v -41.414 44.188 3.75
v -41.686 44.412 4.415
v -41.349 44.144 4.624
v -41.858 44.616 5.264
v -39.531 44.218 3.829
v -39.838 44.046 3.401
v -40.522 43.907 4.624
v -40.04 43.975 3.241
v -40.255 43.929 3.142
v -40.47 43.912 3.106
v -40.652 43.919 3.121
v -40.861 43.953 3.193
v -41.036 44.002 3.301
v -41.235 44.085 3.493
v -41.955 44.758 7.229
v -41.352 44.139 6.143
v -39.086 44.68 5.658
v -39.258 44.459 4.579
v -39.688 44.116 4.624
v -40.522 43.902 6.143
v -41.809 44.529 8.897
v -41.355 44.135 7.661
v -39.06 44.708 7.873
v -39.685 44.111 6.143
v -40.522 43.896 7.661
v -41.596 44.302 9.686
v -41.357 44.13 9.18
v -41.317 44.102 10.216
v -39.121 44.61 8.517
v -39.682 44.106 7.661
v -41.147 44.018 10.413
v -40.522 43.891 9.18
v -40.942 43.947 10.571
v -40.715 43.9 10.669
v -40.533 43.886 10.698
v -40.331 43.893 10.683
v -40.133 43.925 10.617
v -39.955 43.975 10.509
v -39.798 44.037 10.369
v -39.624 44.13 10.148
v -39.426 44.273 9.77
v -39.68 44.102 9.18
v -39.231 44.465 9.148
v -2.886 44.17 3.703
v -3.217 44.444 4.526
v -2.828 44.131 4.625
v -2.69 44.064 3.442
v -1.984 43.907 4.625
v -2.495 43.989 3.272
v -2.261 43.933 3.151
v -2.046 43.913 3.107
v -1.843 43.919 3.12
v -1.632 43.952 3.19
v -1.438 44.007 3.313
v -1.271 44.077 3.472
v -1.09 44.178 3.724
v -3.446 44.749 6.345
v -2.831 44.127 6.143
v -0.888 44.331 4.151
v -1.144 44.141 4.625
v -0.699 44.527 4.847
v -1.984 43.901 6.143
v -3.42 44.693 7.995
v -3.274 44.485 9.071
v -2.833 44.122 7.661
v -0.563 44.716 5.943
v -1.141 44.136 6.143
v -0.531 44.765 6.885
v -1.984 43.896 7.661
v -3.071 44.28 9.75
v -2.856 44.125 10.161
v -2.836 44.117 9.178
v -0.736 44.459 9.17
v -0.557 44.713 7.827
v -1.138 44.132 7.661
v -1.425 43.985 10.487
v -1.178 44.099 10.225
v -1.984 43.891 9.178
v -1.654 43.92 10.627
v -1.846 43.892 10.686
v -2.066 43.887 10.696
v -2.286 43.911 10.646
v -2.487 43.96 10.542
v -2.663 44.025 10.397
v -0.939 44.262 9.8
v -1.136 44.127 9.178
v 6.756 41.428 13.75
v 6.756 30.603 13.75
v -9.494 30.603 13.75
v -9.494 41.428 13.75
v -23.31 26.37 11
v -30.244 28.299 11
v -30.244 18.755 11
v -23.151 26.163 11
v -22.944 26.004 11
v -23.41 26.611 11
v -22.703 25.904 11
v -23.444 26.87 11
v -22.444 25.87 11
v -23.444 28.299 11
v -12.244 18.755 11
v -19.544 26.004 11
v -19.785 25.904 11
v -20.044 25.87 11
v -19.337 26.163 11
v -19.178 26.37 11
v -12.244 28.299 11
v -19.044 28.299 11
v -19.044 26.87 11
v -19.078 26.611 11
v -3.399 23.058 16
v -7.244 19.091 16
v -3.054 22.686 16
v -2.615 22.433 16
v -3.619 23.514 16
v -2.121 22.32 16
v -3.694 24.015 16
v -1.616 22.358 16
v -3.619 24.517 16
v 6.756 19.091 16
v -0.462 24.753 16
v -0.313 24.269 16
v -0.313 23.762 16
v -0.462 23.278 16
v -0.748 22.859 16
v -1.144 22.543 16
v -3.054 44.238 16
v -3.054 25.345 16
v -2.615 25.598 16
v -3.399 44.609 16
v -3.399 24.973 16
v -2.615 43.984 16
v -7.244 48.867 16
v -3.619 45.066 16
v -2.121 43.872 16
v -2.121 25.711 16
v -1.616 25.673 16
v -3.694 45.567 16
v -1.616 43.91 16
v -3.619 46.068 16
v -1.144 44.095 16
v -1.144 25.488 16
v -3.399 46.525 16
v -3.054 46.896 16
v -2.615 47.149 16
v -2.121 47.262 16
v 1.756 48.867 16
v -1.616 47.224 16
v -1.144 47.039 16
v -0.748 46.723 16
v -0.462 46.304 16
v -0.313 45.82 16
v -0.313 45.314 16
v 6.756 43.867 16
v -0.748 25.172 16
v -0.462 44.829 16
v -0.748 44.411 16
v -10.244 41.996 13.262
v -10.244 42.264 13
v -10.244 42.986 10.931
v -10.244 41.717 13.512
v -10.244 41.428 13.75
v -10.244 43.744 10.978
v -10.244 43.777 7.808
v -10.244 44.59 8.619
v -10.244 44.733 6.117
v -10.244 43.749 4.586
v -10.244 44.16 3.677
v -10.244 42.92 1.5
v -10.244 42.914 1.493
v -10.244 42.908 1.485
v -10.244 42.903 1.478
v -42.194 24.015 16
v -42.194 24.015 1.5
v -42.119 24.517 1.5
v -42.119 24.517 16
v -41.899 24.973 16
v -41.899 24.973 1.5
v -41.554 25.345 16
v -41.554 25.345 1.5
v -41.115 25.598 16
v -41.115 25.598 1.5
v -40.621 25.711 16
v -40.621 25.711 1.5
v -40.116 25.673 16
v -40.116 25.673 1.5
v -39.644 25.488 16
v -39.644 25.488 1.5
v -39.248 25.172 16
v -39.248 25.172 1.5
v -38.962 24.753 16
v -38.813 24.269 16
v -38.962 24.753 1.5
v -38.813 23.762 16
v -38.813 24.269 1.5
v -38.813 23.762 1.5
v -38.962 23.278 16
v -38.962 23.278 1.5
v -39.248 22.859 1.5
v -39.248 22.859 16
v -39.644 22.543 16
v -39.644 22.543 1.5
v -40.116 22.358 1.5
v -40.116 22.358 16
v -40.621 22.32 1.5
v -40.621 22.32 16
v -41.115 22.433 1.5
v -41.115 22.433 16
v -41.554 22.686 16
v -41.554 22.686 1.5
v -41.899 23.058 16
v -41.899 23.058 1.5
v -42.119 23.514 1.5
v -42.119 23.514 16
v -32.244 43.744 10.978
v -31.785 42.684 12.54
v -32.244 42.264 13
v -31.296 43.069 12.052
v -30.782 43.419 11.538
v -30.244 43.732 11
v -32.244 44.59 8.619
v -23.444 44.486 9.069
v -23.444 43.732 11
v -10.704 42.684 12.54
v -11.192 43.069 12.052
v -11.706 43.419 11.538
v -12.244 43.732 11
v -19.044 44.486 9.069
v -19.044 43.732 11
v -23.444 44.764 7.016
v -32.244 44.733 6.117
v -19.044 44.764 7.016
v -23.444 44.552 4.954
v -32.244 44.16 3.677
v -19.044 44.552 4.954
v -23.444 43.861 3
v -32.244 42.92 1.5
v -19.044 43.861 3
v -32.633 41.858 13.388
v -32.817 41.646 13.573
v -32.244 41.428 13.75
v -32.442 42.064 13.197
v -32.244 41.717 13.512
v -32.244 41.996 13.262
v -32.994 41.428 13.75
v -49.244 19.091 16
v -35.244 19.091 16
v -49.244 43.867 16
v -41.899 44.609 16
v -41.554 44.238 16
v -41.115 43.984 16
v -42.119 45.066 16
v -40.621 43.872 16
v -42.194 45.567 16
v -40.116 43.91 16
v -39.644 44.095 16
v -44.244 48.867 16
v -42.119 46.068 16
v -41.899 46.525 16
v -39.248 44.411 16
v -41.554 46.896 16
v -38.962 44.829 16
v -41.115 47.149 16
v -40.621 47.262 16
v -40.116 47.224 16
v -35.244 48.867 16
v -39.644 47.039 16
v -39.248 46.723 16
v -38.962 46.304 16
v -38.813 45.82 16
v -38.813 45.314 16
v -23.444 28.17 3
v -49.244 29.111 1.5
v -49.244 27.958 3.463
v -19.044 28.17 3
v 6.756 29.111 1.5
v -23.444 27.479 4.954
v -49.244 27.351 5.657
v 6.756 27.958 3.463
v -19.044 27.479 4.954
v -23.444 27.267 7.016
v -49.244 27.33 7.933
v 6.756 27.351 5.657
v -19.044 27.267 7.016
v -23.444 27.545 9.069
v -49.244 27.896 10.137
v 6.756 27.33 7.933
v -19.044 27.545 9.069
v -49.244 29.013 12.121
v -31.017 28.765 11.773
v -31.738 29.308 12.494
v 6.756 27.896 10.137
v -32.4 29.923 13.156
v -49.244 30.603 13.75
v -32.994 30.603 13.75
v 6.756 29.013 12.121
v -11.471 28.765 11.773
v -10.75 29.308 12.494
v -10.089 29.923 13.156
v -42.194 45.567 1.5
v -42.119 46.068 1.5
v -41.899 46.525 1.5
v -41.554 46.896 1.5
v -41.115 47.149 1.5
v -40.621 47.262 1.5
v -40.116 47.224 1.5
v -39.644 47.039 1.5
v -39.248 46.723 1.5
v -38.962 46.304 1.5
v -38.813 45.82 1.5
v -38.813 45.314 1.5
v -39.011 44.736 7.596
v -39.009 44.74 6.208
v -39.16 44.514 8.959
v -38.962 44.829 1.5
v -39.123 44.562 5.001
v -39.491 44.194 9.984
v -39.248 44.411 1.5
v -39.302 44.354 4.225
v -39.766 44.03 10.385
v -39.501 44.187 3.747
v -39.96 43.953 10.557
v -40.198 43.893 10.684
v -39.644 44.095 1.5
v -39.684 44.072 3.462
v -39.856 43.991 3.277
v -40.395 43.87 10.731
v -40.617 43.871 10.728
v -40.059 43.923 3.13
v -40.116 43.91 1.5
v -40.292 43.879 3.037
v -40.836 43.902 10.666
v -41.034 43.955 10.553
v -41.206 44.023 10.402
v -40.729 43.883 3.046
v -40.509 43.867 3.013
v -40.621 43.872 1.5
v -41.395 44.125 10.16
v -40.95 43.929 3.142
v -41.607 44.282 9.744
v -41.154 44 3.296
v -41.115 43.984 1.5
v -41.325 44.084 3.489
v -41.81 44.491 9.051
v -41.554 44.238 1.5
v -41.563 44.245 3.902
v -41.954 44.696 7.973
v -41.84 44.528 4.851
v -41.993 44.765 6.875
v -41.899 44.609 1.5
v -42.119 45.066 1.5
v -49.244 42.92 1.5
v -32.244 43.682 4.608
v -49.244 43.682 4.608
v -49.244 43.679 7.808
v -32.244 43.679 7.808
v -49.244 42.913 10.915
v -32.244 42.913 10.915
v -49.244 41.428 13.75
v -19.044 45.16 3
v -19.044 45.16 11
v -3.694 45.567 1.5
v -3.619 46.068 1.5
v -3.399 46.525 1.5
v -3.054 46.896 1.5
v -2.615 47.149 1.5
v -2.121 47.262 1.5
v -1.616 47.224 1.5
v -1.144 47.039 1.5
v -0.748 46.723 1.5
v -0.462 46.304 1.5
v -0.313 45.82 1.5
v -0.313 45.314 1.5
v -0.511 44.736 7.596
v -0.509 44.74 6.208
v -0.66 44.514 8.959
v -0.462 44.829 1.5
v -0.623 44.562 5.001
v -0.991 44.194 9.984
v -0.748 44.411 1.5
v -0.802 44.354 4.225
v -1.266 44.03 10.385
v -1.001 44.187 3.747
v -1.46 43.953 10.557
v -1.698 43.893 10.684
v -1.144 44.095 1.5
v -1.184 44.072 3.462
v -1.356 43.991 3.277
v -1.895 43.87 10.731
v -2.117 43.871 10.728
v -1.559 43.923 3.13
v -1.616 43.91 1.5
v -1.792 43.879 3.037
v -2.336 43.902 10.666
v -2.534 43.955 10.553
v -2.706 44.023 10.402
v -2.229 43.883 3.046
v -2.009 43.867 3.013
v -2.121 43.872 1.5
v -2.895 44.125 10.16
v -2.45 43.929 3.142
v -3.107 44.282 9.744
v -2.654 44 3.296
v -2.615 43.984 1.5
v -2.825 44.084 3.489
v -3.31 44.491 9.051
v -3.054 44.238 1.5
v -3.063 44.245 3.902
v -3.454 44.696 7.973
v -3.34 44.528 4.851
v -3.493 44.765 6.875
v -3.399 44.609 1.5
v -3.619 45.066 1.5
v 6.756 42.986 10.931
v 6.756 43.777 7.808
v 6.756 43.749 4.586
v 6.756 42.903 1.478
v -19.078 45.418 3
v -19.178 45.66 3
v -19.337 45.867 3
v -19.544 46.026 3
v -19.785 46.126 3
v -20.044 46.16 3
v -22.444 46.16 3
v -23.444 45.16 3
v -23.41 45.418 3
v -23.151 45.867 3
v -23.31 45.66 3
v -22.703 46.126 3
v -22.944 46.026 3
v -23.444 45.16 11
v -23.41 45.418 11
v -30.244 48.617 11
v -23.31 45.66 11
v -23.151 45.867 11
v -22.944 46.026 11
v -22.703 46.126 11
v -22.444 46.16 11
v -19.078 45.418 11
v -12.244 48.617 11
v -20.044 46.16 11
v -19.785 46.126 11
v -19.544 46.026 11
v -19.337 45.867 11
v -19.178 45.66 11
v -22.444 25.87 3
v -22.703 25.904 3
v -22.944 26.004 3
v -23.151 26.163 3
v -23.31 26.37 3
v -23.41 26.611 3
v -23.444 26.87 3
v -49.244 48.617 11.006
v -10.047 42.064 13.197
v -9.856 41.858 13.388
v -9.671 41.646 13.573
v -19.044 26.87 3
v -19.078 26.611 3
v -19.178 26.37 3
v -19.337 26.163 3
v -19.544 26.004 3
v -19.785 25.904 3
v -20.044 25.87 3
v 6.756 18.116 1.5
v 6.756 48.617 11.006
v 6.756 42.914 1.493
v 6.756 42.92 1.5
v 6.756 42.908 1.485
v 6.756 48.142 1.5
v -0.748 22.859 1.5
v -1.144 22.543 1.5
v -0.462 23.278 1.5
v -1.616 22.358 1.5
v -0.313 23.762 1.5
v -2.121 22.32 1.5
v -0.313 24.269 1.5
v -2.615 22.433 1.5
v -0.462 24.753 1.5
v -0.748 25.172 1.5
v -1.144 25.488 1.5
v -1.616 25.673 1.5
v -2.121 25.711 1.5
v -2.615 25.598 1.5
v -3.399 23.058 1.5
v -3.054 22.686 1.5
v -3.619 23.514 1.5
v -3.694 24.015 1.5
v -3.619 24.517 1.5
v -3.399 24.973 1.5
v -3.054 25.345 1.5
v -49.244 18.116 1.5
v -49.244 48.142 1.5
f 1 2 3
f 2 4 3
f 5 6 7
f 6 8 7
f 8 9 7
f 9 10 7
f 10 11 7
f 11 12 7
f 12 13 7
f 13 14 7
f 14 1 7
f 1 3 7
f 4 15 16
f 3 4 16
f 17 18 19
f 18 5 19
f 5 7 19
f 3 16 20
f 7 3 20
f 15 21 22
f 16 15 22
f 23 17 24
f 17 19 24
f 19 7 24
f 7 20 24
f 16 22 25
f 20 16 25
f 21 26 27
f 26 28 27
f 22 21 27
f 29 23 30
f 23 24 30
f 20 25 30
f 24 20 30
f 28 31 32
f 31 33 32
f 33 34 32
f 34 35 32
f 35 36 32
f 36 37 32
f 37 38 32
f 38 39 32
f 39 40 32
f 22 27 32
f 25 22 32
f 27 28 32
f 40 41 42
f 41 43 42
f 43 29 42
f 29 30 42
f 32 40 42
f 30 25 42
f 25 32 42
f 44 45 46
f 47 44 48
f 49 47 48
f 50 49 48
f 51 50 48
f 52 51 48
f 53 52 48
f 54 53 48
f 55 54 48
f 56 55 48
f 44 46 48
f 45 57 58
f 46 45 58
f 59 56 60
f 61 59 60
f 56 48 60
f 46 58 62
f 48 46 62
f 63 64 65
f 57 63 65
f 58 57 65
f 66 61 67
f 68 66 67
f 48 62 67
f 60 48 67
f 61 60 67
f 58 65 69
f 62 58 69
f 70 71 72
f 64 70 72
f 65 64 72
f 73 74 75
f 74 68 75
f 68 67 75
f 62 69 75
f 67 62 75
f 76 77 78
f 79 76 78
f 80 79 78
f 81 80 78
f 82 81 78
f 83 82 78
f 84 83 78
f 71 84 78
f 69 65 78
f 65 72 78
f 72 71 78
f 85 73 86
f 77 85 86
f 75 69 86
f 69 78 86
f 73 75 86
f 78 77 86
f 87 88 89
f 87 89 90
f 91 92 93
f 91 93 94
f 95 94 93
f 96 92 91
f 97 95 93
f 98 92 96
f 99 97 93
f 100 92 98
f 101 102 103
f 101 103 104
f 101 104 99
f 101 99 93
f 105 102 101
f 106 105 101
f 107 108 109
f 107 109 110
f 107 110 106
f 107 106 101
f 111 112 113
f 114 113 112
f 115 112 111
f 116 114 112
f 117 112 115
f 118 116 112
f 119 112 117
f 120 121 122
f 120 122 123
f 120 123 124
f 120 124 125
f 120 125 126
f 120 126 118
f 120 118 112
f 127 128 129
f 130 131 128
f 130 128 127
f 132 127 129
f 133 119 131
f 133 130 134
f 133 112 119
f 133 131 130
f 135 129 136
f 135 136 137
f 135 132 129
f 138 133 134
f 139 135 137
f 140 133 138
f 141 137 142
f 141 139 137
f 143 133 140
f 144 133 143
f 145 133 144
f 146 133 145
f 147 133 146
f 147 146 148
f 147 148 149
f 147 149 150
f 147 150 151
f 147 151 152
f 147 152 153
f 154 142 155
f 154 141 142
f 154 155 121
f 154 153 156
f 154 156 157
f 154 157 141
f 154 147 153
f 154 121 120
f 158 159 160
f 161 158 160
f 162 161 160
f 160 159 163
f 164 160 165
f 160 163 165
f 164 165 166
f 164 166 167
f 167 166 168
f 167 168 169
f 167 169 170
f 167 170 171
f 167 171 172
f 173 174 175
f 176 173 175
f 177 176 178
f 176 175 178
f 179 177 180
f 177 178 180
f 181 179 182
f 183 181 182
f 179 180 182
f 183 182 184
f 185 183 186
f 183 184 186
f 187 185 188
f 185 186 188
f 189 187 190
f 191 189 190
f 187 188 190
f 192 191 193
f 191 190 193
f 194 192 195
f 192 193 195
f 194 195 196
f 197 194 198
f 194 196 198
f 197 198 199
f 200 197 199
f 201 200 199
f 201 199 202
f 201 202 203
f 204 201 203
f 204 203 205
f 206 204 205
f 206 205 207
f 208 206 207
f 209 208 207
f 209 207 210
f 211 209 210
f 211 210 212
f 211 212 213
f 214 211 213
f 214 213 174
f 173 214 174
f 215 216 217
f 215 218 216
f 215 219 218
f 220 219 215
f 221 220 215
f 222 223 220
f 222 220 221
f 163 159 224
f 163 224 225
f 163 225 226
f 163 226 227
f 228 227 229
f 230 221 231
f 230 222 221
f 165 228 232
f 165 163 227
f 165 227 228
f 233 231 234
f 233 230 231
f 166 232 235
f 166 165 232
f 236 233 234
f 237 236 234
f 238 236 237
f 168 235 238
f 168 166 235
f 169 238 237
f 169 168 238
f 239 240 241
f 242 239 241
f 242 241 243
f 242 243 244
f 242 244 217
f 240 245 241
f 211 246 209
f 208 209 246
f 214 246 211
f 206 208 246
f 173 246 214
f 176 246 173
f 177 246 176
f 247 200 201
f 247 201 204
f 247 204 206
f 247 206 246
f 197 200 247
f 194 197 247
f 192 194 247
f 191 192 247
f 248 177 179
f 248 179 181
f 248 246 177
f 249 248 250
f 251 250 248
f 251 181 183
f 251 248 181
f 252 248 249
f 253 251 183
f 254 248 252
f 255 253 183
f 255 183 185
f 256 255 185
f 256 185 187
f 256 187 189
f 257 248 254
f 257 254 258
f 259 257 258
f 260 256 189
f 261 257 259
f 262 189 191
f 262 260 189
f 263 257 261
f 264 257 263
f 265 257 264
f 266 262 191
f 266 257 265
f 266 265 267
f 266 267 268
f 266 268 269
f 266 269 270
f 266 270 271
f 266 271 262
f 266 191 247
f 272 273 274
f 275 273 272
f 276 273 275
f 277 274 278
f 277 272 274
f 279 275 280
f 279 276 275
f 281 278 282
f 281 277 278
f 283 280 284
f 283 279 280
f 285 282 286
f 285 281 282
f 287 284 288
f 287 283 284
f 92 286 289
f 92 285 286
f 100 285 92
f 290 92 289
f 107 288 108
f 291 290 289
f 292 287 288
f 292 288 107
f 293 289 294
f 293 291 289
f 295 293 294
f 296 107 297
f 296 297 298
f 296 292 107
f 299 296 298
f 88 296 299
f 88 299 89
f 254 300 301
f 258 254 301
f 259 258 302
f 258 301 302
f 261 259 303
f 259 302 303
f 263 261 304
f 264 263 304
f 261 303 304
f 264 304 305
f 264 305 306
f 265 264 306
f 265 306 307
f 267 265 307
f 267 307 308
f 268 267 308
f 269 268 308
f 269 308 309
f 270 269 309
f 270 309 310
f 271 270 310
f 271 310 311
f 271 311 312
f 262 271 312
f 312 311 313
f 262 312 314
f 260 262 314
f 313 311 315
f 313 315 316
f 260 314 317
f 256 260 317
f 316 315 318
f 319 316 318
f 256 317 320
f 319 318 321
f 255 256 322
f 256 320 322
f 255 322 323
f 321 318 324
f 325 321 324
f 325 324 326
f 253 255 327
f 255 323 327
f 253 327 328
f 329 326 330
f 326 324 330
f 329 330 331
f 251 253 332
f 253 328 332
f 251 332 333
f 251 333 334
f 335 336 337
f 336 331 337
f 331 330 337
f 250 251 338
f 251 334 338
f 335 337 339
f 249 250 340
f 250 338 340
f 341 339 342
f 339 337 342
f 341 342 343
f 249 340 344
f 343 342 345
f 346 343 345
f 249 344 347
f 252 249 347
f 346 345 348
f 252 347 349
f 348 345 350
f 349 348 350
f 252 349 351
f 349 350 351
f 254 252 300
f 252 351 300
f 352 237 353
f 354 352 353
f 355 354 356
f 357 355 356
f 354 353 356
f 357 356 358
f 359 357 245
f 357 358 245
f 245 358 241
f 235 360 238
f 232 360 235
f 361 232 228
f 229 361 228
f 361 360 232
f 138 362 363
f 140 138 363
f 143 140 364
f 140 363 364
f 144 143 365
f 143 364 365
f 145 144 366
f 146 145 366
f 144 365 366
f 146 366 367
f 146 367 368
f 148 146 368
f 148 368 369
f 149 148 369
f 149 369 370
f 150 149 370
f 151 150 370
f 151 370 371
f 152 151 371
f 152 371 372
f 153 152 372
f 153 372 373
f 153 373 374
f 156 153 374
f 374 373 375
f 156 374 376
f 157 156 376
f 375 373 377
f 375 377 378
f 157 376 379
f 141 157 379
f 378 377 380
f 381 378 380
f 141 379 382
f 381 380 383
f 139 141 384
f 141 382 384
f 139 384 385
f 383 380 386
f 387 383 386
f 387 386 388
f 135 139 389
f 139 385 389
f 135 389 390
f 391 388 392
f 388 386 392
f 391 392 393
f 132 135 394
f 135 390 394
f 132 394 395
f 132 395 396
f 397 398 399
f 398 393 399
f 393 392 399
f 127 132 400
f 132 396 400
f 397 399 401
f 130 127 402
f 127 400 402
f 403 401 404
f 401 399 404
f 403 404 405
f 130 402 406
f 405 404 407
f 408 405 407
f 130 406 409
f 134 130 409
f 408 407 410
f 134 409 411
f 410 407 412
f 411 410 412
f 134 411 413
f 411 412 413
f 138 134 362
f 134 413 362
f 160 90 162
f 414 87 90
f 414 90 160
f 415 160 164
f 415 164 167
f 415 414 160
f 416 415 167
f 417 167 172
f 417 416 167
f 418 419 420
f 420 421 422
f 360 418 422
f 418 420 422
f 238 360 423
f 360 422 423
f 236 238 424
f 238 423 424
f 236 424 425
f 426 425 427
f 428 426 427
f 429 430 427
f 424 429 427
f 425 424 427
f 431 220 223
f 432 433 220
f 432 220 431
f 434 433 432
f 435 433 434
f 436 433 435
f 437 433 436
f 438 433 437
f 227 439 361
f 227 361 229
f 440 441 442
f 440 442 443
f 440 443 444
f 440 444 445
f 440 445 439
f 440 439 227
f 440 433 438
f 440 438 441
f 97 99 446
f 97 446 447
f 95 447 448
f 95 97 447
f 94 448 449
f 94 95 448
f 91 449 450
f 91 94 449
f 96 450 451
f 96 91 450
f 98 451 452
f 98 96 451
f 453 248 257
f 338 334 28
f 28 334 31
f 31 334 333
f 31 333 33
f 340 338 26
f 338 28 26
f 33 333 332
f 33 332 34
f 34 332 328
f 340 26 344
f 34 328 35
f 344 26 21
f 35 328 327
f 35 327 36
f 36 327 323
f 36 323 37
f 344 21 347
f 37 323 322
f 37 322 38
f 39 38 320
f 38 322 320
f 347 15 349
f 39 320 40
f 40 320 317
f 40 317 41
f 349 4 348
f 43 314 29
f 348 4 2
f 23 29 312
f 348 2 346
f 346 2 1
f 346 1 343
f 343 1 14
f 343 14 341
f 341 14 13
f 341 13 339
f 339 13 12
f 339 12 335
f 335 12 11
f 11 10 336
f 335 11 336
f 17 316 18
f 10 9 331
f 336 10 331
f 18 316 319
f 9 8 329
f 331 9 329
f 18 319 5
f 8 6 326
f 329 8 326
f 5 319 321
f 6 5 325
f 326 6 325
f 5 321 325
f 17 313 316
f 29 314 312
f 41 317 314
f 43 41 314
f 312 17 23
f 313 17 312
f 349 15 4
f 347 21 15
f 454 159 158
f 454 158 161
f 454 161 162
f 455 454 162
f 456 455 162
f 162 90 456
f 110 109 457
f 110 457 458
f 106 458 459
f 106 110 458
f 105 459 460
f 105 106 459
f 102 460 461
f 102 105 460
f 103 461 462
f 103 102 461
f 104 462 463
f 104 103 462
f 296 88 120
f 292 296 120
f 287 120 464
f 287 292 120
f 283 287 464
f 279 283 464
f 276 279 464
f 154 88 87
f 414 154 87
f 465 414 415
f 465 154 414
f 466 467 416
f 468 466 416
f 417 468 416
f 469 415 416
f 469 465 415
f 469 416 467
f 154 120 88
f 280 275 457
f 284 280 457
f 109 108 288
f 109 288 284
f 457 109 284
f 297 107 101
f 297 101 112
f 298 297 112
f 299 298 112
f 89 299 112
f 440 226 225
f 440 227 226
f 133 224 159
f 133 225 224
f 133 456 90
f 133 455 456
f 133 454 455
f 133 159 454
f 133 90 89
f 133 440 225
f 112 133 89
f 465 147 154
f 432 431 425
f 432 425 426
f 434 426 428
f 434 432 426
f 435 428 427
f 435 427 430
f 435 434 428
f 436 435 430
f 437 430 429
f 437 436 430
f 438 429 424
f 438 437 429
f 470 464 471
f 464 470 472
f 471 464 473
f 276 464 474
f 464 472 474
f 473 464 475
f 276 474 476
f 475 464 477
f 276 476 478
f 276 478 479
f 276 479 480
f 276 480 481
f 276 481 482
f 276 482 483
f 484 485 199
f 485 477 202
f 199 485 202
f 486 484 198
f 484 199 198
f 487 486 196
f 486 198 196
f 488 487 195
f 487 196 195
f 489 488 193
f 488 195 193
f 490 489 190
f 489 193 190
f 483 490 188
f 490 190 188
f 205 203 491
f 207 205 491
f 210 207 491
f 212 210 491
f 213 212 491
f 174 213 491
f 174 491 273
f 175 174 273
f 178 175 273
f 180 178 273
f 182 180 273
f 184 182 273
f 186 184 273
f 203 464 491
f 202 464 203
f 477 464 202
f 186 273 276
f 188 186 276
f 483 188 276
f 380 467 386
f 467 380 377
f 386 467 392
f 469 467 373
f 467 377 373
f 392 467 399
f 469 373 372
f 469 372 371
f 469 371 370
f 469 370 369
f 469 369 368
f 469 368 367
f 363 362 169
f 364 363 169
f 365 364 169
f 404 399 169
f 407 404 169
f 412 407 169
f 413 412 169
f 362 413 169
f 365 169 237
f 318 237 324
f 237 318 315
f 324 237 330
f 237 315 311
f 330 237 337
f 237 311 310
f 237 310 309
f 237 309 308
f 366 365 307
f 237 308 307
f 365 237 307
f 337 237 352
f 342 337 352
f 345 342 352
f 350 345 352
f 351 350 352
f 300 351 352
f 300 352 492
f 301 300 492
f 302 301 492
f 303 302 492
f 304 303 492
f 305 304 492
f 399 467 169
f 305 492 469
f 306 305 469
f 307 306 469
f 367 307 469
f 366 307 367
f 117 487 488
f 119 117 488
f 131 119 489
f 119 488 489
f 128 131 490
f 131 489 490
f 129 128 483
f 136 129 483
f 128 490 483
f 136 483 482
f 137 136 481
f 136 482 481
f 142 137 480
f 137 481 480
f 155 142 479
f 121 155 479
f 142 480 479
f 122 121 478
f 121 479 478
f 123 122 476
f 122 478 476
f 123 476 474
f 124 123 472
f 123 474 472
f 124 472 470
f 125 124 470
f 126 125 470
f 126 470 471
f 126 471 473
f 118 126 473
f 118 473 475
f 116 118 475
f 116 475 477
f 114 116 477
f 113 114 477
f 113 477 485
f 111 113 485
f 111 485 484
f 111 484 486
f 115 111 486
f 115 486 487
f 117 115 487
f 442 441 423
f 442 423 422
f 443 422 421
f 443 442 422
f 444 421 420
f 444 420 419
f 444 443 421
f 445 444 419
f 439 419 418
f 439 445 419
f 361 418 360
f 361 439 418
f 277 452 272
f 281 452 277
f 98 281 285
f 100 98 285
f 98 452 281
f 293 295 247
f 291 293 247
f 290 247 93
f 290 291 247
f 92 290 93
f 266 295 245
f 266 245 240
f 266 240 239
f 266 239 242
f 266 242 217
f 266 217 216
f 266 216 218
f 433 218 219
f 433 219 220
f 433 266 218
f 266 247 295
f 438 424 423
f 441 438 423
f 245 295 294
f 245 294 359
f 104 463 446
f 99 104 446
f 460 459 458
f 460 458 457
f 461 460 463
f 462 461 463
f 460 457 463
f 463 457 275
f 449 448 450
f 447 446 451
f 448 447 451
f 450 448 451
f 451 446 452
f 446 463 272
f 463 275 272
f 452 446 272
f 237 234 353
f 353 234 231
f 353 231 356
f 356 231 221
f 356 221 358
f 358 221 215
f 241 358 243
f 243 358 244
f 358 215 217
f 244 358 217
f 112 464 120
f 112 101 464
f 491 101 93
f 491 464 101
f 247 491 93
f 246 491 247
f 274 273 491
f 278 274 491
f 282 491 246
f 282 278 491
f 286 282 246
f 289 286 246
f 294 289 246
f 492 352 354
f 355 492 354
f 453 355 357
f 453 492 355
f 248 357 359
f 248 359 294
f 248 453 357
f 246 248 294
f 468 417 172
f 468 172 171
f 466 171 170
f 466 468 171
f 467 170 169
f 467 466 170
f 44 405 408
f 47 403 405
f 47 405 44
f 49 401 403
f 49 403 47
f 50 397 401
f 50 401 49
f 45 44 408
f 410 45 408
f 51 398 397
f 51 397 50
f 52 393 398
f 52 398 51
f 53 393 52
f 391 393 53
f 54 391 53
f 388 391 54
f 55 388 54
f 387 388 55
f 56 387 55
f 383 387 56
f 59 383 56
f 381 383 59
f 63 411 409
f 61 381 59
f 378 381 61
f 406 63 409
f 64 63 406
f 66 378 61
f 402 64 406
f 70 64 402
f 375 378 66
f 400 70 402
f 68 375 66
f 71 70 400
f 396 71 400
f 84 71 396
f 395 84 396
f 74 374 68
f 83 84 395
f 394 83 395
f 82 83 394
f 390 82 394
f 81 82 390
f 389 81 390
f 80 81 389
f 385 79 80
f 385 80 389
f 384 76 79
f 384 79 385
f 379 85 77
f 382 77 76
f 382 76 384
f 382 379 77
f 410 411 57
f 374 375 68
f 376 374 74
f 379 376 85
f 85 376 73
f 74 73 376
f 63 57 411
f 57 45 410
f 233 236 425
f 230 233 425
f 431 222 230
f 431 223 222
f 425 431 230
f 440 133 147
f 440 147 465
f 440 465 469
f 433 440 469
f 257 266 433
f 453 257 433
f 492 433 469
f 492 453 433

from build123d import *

# Parameters (mm, degrees)
ESBO_O1_W                        = 56
ESBO_O1_H                        = 28.051471863
RESSALTO_EXTRUS_O1_DEPTH         = 16
CORTE_EXTRUS_O1_DEPTH            = 100
ESBO_O3_W                        = 18
ESBO_O3_H                        = 28.051471863
CORTE_EXTRUS_O2_DEPTH            = 5
FURO_COM_FOLGA_DE_M32_D          = 3.4
FURO_COM_FOLGA_DE_M34_D          = 3.4
CHANFRO1_SIZE                    = 5
CORTE_EXTRUS_O3_DEPTH            = 8
RESSALTO_EXTRUS_O3_DEPTH         = 56
CORTE_EXTRUS_O4_DEPTH            = 100
CHANFRO2_START                   = 38.631741411
CHANFRO2_OUTLINE_W               = 9
CHANFRO2_OUTLINE_H               = 10
CHANFRO2_DEPTH                   = 4.368258589
CHANFRO3_START                   = -67
CHANFRO3_OUTLINE_W               = 9
CHANFRO3_OUTLINE_H               = 10
CHANFRO3_DEPTH                   = 3.439248526
RESSALTO_EXTRUS_O4_DEPTH         = 2
CORTE_EXTRUS_O5_DEPTH            = 100
CORTE_EXTRUS_O6_START            = -56
ESBO_O24_W                       = 1.5
ESBO_O24_H                       = 30.126471863
CORTE_EXTRUS_O6_DEPTH            = 56
RESSALTO_EXTRUS_O6_DEPTH         = 17
RESSALTO_EXTRUS_O7_START         = -17
RESSALTO_EXTRUS_O7_DEPTH         = 17
ESBO_O29_R                       = 1.7
CORTE_EXTRUS_O16_DEPTH           = 17
CORTE_EXTRUS_O16_DRAFT           = -0.2
CORTE_EXTRUS_O16_PROFILE_2_DEPTH = 17
CORTE_EXTRUS_O16_PROFILE_2_DRAFT = -0.2


with BuildPart() as part:
    # Esboço1 → Ressalto-extrusão1 (new body)
    with BuildSketch(Plane.XY):
        with Locations((-21.244121058, 34.04115584)):
            Rectangle(ESBO_O1_W, ESBO_O1_H)
    extrude(amount=RESSALTO_EXTRUS_O1_DEPTH)

    # Esboço2 → Corte-extrusão1 (cut)
    with BuildSketch(Plane(origin=(6.755878942, 0, 0), x_dir=(0, 0, -1), z_dir=(1, 0, 0))):
        with BuildLine():
            Line((0, 41.428078682), (0, 30.602761135))
            ThreePointArc((0, 30.602761135), (-6.875, 27.265419908), (-13.75, 30.602761135))
            Line((-13.75, 30.602761135), (-13.75, 41.428078682))
            ThreePointArc((-13.75, 41.428078682), (-6.875, 44.765419908), (0, 41.428078682))
        make_face()
    extrude(amount=-CORTE_EXTRUS_O1_DEPTH, mode=Mode.SUBTRACT)

    # Esboço3 → Corte-extrusão2 (cut)
    with BuildSketch(Plane.XY.offset(16)):
        with Locations((-21.244121058, 34.04115584)):
            Rectangle(ESBO_O3_W, ESBO_O3_H)
    extrude(amount=-CORTE_EXTRUS_O2_DEPTH, mode=Mode.SUBTRACT)

    # Furo com folga de M32 (through all)
    with Locations(Plane.XY.offset(16)):
        with Locations((-1.994121058, 45.566891771), (-40.494121058, 45.566891771)):
            Hole(FURO_COM_FOLGA_DE_M32_D / 2)

    # Furo com folga de M34 (through all)
    with Locations(Plane.XY.offset(16)):
        with Locations((-1.994121058, 24.015419908), (-40.494121058, 24.015419908)):
            Hole(FURO_COM_FOLGA_DE_M34_D / 2)

    # Chanfro1
    # the kernel refuses this chamfer: 5 mm, written as the material it takes off along each edge
    with BuildSketch(Plane(origin=(-12.244121058, 7.157004969, 16), x_dir=(1, 0, 0), z_dir=(0, 1, 0))) as chanfro1_piece_1:
        Polygon((CHANFRO1_SIZE, 0), (0, CHANFRO1_SIZE), (0, 0), align=None)
    extrude(amount=53.768301742, mode=Mode.SUBTRACT)
    with BuildSketch(Plane(origin=(-30.244121058, 60.925306711, 16), x_dir=(0, 0, -1), z_dir=(0, -1, 0))) as chanfro1_piece_2:
        Polygon((CHANFRO1_SIZE, 0), (0, -CHANFRO1_SIZE), (0, 0), align=None)
    extrude(amount=53.768301742, mode=Mode.SUBTRACT)

    # Esboço17 → Corte-extrusão3 (cut)
    with BuildSketch(Plane.XY.offset(11)):
        with BuildLine():
            Line((-20.044121058, 25.869616944), (-22.444121058, 25.869616944))
            ThreePointArc((-22.444121058, 25.869616944), (-23.151227839, 26.162510163), (-23.444121058, 26.869616944))
            Line((-23.444121058, 26.869616944), (-23.444121058, 27.069616944))
            Line((-23.444121058, 27.069616944), (-23.444121058, 44.959616944))
            Line((-23.444121058, 44.959616944), (-23.444121058, 45.159616944))
            ThreePointArc((-23.444121058, 45.159616944), (-23.151227839, 45.866723726), (-22.444121058, 46.159616944))
            Line((-22.444121058, 46.159616944), (-20.044121058, 46.159616944))
            ThreePointArc((-20.044121058, 46.159616944), (-19.337014277, 45.866723726), (-19.044121058, 45.159616944))
            Line((-19.044121058, 45.159616944), (-19.044121058, 43.159616944))
            Line((-19.044121058, 43.159616944), (-19.044121058, 36.014616944))
            Line((-19.044121058, 36.014616944), (-19.044121058, 26.869616944))
            ThreePointArc((-19.044121058, 26.869616944), (-19.337014277, 26.162510163), (-20.044121058, 25.869616944))
        make_face()
    extrude(amount=-CORTE_EXTRUS_O3_DEPTH, mode=Mode.SUBTRACT)

    # Esboço20 → Ressalto-extrusão3 (add)
    with BuildSketch(Plane.ZY.offset(49.244121058)):
        Polygon((0, 48.066891771), (16, 48.066891771), (16, 48.866891771), align=None)
    extrude(amount=-RESSALTO_EXTRUS_O3_DEPTH)

    # Esboço21 → Corte-extrusão4 (cut)
    with BuildSketch(Plane.XZ.offset(-48.066891771)):
        Polygon((-7.244121058, 16), (-12.244121058, 11), (-30.244121058, 11), (-35.244121058, 16), align=None)
    extrude(amount=-CORTE_EXTRUS_O4_DEPTH, mode=Mode.SUBTRACT)

    # Chanfro2: read off the stored shape, not the designer's step
    # Chanfro2 outline → Chanfro2 (cut)
    with BuildSketch(Plane(origin=(0, 0, 0), x_dir=(0.8097846116702572, -0.42511166270745215, -0.4043871374464777), z_dir=(0.586727264324789, 0.58672726432479, 0.558123852380363)).offset(CHANFRO2_START)):
        with Locations((-22.5, 22)):
            Rectangle(CHANFRO2_OUTLINE_W, CHANFRO2_OUTLINE_H)
    extrude(amount=CHANFRO2_DEPTH, mode=Mode.SUBTRACT)

    # Chanfro3: read off the stored shape, not the designer's step
    # Chanfro3 outline → Chanfro3 (cut)
    with BuildSketch(Plane(origin=(0, 0, 0), x_dir=(0.8097846116702566, 0.4251116627074525, 0.404387137446478), z_dir=(0.5867272643247896, -0.5867272643247896, -0.5581238523803627)).offset(CHANFRO3_START)):
        with Locations((-11.5, -22)):
            Rectangle(CHANFRO3_OUTLINE_W, CHANFRO3_OUTLINE_H)
    extrude(amount=CHANFRO3_DEPTH, mode=Mode.SUBTRACT)

    # Esboço22 → Ressalto-extrusão4 (add)
    with BuildSketch(Plane.XZ.offset(-20.015419908)):
        Polygon((-49.244121058, 16), (-35.244121058, 16), (-30.244121058, 11), (-12.244121058, 11), (-7.244121058, 16), (6.755878942, 16), (6.755878942, 0), (-49.244121058, 0), align=None)
    extrude(amount=RESSALTO_EXTRUS_O4_DEPTH)

    # Esboço23 → Corte-extrusão5 (cut)
    with BuildSketch(Plane.ZY.offset(49.244121058)):
        Polygon((0, 18.015419908), (16, 19.091373139), (16, 18.015419908), align=None)
    extrude(amount=-CORTE_EXTRUS_O5_DEPTH, mode=Mode.SUBTRACT)

    # Esboço24 → Corte-extrusão6 (cut)
    with BuildSketch(Plane(origin=(6.755878942, 0, 0), x_dir=(0, 0, -1), z_dir=(1, 0, 0)).offset(CORTE_EXTRUS_O6_START)):
        with Locations((-0.75, 33.07865584)):
            Rectangle(ESBO_O24_W, ESBO_O24_H)
    extrude(amount=CORTE_EXTRUS_O6_DEPTH, mode=Mode.SUBTRACT)

    # Esboço26 → Ressalto-extrusão6 (add)
    with BuildSketch(Plane(origin=(6.755878942, 0, 0), x_dir=(0, 0, -1), z_dir=(1, 0, 0))):
        with BuildLine():
            ThreePointArc((-13.75, 41.428078682), (-7.807709843, 43.777058017), (-1.47808403, 42.902785008))
            ThreePointArc((-1.47808403, 42.902785008), (-7.918969725, 44.702918237), (-13.75, 41.428078682))
        make_face()
    extrude(amount=-RESSALTO_EXTRUS_O6_DEPTH)

    # Esboço28 → Ressalto-extrusão7 (add)
    with BuildSketch(Plane.ZY.offset(49.244121058).offset(RESSALTO_EXTRUS_O7_START)):
        with BuildLine():
            ThreePointArc((13.75, 41.428078682), (7.932773281, 44.701248348), (1.5, 42.919902148))
            ThreePointArc((1.5, 42.919902148), (7.808321968, 43.679325435), (13.75, 41.428078682))
        make_face()
    extrude(amount=RESSALTO_EXTRUS_O7_DEPTH)


with BuildPart() as corte_extrus_o16_tool:
    # Esboço29 → Corte-extrusão16 (with draft: the straight prism first)
    with BuildSketch(Plane.XY.offset(16)):
        with Locations((-40.494121058, 45.566891771)):
            Circle(ESBO_O29_R)
    extrude(amount=-CORTE_EXTRUS_O16_DEPTH)
    # Corte-extrusão16: the draft: its side faces are tilted about the plane it starts from
    corte_extrus_o16_sides = [corte_extrus_o16_tool.faces().sort_by_distance(p)[0] for p in [
        (-42.194121058, 45.566891771, 7.5),
    ]]
    draft(corte_extrus_o16_sides, Plane.XY.offset(16), CORTE_EXTRUS_O16_DRAFT)


with BuildPart() as part_1:
    add(part.part)

    # Corte-extrusão16: cut by corte_extrus_o16_tool
    add(corte_extrus_o16_tool.part, mode=Mode.SUBTRACT)


with BuildPart() as corte_extrus_o16_profile_2_tool:
    # Esboço29 → Corte-extrusão16 profile 2 (with draft: the straight prism first)
    with BuildSketch(Plane.XY.offset(16)):
        with Locations((-1.994121058, 45.566891771)):
            Circle(ESBO_O29_R)
    extrude(amount=-CORTE_EXTRUS_O16_PROFILE_2_DEPTH)
    # Corte-extrusão16 profile 2: the draft: its side faces are tilted about the plane it starts from
    corte_extrus_o16_profile_2_sides = [corte_extrus_o16_profile_2_tool.faces().sort_by_distance(p)[0] for p in [
        (-3.694121058, 45.566891771, 7.5),
    ]]
    draft(corte_extrus_o16_profile_2_sides, Plane.XY.offset(16), CORTE_EXTRUS_O16_PROFILE_2_DRAFT)


with BuildPart() as part_2:
    add(part_1.part)

    # Corte-extrusão16 profile 2: cut by corte_extrus_o16_profile_2_tool
    add(corte_extrus_o16_profile_2_tool.part, mode=Mode.SUBTRACT)


solid = part_2.part
